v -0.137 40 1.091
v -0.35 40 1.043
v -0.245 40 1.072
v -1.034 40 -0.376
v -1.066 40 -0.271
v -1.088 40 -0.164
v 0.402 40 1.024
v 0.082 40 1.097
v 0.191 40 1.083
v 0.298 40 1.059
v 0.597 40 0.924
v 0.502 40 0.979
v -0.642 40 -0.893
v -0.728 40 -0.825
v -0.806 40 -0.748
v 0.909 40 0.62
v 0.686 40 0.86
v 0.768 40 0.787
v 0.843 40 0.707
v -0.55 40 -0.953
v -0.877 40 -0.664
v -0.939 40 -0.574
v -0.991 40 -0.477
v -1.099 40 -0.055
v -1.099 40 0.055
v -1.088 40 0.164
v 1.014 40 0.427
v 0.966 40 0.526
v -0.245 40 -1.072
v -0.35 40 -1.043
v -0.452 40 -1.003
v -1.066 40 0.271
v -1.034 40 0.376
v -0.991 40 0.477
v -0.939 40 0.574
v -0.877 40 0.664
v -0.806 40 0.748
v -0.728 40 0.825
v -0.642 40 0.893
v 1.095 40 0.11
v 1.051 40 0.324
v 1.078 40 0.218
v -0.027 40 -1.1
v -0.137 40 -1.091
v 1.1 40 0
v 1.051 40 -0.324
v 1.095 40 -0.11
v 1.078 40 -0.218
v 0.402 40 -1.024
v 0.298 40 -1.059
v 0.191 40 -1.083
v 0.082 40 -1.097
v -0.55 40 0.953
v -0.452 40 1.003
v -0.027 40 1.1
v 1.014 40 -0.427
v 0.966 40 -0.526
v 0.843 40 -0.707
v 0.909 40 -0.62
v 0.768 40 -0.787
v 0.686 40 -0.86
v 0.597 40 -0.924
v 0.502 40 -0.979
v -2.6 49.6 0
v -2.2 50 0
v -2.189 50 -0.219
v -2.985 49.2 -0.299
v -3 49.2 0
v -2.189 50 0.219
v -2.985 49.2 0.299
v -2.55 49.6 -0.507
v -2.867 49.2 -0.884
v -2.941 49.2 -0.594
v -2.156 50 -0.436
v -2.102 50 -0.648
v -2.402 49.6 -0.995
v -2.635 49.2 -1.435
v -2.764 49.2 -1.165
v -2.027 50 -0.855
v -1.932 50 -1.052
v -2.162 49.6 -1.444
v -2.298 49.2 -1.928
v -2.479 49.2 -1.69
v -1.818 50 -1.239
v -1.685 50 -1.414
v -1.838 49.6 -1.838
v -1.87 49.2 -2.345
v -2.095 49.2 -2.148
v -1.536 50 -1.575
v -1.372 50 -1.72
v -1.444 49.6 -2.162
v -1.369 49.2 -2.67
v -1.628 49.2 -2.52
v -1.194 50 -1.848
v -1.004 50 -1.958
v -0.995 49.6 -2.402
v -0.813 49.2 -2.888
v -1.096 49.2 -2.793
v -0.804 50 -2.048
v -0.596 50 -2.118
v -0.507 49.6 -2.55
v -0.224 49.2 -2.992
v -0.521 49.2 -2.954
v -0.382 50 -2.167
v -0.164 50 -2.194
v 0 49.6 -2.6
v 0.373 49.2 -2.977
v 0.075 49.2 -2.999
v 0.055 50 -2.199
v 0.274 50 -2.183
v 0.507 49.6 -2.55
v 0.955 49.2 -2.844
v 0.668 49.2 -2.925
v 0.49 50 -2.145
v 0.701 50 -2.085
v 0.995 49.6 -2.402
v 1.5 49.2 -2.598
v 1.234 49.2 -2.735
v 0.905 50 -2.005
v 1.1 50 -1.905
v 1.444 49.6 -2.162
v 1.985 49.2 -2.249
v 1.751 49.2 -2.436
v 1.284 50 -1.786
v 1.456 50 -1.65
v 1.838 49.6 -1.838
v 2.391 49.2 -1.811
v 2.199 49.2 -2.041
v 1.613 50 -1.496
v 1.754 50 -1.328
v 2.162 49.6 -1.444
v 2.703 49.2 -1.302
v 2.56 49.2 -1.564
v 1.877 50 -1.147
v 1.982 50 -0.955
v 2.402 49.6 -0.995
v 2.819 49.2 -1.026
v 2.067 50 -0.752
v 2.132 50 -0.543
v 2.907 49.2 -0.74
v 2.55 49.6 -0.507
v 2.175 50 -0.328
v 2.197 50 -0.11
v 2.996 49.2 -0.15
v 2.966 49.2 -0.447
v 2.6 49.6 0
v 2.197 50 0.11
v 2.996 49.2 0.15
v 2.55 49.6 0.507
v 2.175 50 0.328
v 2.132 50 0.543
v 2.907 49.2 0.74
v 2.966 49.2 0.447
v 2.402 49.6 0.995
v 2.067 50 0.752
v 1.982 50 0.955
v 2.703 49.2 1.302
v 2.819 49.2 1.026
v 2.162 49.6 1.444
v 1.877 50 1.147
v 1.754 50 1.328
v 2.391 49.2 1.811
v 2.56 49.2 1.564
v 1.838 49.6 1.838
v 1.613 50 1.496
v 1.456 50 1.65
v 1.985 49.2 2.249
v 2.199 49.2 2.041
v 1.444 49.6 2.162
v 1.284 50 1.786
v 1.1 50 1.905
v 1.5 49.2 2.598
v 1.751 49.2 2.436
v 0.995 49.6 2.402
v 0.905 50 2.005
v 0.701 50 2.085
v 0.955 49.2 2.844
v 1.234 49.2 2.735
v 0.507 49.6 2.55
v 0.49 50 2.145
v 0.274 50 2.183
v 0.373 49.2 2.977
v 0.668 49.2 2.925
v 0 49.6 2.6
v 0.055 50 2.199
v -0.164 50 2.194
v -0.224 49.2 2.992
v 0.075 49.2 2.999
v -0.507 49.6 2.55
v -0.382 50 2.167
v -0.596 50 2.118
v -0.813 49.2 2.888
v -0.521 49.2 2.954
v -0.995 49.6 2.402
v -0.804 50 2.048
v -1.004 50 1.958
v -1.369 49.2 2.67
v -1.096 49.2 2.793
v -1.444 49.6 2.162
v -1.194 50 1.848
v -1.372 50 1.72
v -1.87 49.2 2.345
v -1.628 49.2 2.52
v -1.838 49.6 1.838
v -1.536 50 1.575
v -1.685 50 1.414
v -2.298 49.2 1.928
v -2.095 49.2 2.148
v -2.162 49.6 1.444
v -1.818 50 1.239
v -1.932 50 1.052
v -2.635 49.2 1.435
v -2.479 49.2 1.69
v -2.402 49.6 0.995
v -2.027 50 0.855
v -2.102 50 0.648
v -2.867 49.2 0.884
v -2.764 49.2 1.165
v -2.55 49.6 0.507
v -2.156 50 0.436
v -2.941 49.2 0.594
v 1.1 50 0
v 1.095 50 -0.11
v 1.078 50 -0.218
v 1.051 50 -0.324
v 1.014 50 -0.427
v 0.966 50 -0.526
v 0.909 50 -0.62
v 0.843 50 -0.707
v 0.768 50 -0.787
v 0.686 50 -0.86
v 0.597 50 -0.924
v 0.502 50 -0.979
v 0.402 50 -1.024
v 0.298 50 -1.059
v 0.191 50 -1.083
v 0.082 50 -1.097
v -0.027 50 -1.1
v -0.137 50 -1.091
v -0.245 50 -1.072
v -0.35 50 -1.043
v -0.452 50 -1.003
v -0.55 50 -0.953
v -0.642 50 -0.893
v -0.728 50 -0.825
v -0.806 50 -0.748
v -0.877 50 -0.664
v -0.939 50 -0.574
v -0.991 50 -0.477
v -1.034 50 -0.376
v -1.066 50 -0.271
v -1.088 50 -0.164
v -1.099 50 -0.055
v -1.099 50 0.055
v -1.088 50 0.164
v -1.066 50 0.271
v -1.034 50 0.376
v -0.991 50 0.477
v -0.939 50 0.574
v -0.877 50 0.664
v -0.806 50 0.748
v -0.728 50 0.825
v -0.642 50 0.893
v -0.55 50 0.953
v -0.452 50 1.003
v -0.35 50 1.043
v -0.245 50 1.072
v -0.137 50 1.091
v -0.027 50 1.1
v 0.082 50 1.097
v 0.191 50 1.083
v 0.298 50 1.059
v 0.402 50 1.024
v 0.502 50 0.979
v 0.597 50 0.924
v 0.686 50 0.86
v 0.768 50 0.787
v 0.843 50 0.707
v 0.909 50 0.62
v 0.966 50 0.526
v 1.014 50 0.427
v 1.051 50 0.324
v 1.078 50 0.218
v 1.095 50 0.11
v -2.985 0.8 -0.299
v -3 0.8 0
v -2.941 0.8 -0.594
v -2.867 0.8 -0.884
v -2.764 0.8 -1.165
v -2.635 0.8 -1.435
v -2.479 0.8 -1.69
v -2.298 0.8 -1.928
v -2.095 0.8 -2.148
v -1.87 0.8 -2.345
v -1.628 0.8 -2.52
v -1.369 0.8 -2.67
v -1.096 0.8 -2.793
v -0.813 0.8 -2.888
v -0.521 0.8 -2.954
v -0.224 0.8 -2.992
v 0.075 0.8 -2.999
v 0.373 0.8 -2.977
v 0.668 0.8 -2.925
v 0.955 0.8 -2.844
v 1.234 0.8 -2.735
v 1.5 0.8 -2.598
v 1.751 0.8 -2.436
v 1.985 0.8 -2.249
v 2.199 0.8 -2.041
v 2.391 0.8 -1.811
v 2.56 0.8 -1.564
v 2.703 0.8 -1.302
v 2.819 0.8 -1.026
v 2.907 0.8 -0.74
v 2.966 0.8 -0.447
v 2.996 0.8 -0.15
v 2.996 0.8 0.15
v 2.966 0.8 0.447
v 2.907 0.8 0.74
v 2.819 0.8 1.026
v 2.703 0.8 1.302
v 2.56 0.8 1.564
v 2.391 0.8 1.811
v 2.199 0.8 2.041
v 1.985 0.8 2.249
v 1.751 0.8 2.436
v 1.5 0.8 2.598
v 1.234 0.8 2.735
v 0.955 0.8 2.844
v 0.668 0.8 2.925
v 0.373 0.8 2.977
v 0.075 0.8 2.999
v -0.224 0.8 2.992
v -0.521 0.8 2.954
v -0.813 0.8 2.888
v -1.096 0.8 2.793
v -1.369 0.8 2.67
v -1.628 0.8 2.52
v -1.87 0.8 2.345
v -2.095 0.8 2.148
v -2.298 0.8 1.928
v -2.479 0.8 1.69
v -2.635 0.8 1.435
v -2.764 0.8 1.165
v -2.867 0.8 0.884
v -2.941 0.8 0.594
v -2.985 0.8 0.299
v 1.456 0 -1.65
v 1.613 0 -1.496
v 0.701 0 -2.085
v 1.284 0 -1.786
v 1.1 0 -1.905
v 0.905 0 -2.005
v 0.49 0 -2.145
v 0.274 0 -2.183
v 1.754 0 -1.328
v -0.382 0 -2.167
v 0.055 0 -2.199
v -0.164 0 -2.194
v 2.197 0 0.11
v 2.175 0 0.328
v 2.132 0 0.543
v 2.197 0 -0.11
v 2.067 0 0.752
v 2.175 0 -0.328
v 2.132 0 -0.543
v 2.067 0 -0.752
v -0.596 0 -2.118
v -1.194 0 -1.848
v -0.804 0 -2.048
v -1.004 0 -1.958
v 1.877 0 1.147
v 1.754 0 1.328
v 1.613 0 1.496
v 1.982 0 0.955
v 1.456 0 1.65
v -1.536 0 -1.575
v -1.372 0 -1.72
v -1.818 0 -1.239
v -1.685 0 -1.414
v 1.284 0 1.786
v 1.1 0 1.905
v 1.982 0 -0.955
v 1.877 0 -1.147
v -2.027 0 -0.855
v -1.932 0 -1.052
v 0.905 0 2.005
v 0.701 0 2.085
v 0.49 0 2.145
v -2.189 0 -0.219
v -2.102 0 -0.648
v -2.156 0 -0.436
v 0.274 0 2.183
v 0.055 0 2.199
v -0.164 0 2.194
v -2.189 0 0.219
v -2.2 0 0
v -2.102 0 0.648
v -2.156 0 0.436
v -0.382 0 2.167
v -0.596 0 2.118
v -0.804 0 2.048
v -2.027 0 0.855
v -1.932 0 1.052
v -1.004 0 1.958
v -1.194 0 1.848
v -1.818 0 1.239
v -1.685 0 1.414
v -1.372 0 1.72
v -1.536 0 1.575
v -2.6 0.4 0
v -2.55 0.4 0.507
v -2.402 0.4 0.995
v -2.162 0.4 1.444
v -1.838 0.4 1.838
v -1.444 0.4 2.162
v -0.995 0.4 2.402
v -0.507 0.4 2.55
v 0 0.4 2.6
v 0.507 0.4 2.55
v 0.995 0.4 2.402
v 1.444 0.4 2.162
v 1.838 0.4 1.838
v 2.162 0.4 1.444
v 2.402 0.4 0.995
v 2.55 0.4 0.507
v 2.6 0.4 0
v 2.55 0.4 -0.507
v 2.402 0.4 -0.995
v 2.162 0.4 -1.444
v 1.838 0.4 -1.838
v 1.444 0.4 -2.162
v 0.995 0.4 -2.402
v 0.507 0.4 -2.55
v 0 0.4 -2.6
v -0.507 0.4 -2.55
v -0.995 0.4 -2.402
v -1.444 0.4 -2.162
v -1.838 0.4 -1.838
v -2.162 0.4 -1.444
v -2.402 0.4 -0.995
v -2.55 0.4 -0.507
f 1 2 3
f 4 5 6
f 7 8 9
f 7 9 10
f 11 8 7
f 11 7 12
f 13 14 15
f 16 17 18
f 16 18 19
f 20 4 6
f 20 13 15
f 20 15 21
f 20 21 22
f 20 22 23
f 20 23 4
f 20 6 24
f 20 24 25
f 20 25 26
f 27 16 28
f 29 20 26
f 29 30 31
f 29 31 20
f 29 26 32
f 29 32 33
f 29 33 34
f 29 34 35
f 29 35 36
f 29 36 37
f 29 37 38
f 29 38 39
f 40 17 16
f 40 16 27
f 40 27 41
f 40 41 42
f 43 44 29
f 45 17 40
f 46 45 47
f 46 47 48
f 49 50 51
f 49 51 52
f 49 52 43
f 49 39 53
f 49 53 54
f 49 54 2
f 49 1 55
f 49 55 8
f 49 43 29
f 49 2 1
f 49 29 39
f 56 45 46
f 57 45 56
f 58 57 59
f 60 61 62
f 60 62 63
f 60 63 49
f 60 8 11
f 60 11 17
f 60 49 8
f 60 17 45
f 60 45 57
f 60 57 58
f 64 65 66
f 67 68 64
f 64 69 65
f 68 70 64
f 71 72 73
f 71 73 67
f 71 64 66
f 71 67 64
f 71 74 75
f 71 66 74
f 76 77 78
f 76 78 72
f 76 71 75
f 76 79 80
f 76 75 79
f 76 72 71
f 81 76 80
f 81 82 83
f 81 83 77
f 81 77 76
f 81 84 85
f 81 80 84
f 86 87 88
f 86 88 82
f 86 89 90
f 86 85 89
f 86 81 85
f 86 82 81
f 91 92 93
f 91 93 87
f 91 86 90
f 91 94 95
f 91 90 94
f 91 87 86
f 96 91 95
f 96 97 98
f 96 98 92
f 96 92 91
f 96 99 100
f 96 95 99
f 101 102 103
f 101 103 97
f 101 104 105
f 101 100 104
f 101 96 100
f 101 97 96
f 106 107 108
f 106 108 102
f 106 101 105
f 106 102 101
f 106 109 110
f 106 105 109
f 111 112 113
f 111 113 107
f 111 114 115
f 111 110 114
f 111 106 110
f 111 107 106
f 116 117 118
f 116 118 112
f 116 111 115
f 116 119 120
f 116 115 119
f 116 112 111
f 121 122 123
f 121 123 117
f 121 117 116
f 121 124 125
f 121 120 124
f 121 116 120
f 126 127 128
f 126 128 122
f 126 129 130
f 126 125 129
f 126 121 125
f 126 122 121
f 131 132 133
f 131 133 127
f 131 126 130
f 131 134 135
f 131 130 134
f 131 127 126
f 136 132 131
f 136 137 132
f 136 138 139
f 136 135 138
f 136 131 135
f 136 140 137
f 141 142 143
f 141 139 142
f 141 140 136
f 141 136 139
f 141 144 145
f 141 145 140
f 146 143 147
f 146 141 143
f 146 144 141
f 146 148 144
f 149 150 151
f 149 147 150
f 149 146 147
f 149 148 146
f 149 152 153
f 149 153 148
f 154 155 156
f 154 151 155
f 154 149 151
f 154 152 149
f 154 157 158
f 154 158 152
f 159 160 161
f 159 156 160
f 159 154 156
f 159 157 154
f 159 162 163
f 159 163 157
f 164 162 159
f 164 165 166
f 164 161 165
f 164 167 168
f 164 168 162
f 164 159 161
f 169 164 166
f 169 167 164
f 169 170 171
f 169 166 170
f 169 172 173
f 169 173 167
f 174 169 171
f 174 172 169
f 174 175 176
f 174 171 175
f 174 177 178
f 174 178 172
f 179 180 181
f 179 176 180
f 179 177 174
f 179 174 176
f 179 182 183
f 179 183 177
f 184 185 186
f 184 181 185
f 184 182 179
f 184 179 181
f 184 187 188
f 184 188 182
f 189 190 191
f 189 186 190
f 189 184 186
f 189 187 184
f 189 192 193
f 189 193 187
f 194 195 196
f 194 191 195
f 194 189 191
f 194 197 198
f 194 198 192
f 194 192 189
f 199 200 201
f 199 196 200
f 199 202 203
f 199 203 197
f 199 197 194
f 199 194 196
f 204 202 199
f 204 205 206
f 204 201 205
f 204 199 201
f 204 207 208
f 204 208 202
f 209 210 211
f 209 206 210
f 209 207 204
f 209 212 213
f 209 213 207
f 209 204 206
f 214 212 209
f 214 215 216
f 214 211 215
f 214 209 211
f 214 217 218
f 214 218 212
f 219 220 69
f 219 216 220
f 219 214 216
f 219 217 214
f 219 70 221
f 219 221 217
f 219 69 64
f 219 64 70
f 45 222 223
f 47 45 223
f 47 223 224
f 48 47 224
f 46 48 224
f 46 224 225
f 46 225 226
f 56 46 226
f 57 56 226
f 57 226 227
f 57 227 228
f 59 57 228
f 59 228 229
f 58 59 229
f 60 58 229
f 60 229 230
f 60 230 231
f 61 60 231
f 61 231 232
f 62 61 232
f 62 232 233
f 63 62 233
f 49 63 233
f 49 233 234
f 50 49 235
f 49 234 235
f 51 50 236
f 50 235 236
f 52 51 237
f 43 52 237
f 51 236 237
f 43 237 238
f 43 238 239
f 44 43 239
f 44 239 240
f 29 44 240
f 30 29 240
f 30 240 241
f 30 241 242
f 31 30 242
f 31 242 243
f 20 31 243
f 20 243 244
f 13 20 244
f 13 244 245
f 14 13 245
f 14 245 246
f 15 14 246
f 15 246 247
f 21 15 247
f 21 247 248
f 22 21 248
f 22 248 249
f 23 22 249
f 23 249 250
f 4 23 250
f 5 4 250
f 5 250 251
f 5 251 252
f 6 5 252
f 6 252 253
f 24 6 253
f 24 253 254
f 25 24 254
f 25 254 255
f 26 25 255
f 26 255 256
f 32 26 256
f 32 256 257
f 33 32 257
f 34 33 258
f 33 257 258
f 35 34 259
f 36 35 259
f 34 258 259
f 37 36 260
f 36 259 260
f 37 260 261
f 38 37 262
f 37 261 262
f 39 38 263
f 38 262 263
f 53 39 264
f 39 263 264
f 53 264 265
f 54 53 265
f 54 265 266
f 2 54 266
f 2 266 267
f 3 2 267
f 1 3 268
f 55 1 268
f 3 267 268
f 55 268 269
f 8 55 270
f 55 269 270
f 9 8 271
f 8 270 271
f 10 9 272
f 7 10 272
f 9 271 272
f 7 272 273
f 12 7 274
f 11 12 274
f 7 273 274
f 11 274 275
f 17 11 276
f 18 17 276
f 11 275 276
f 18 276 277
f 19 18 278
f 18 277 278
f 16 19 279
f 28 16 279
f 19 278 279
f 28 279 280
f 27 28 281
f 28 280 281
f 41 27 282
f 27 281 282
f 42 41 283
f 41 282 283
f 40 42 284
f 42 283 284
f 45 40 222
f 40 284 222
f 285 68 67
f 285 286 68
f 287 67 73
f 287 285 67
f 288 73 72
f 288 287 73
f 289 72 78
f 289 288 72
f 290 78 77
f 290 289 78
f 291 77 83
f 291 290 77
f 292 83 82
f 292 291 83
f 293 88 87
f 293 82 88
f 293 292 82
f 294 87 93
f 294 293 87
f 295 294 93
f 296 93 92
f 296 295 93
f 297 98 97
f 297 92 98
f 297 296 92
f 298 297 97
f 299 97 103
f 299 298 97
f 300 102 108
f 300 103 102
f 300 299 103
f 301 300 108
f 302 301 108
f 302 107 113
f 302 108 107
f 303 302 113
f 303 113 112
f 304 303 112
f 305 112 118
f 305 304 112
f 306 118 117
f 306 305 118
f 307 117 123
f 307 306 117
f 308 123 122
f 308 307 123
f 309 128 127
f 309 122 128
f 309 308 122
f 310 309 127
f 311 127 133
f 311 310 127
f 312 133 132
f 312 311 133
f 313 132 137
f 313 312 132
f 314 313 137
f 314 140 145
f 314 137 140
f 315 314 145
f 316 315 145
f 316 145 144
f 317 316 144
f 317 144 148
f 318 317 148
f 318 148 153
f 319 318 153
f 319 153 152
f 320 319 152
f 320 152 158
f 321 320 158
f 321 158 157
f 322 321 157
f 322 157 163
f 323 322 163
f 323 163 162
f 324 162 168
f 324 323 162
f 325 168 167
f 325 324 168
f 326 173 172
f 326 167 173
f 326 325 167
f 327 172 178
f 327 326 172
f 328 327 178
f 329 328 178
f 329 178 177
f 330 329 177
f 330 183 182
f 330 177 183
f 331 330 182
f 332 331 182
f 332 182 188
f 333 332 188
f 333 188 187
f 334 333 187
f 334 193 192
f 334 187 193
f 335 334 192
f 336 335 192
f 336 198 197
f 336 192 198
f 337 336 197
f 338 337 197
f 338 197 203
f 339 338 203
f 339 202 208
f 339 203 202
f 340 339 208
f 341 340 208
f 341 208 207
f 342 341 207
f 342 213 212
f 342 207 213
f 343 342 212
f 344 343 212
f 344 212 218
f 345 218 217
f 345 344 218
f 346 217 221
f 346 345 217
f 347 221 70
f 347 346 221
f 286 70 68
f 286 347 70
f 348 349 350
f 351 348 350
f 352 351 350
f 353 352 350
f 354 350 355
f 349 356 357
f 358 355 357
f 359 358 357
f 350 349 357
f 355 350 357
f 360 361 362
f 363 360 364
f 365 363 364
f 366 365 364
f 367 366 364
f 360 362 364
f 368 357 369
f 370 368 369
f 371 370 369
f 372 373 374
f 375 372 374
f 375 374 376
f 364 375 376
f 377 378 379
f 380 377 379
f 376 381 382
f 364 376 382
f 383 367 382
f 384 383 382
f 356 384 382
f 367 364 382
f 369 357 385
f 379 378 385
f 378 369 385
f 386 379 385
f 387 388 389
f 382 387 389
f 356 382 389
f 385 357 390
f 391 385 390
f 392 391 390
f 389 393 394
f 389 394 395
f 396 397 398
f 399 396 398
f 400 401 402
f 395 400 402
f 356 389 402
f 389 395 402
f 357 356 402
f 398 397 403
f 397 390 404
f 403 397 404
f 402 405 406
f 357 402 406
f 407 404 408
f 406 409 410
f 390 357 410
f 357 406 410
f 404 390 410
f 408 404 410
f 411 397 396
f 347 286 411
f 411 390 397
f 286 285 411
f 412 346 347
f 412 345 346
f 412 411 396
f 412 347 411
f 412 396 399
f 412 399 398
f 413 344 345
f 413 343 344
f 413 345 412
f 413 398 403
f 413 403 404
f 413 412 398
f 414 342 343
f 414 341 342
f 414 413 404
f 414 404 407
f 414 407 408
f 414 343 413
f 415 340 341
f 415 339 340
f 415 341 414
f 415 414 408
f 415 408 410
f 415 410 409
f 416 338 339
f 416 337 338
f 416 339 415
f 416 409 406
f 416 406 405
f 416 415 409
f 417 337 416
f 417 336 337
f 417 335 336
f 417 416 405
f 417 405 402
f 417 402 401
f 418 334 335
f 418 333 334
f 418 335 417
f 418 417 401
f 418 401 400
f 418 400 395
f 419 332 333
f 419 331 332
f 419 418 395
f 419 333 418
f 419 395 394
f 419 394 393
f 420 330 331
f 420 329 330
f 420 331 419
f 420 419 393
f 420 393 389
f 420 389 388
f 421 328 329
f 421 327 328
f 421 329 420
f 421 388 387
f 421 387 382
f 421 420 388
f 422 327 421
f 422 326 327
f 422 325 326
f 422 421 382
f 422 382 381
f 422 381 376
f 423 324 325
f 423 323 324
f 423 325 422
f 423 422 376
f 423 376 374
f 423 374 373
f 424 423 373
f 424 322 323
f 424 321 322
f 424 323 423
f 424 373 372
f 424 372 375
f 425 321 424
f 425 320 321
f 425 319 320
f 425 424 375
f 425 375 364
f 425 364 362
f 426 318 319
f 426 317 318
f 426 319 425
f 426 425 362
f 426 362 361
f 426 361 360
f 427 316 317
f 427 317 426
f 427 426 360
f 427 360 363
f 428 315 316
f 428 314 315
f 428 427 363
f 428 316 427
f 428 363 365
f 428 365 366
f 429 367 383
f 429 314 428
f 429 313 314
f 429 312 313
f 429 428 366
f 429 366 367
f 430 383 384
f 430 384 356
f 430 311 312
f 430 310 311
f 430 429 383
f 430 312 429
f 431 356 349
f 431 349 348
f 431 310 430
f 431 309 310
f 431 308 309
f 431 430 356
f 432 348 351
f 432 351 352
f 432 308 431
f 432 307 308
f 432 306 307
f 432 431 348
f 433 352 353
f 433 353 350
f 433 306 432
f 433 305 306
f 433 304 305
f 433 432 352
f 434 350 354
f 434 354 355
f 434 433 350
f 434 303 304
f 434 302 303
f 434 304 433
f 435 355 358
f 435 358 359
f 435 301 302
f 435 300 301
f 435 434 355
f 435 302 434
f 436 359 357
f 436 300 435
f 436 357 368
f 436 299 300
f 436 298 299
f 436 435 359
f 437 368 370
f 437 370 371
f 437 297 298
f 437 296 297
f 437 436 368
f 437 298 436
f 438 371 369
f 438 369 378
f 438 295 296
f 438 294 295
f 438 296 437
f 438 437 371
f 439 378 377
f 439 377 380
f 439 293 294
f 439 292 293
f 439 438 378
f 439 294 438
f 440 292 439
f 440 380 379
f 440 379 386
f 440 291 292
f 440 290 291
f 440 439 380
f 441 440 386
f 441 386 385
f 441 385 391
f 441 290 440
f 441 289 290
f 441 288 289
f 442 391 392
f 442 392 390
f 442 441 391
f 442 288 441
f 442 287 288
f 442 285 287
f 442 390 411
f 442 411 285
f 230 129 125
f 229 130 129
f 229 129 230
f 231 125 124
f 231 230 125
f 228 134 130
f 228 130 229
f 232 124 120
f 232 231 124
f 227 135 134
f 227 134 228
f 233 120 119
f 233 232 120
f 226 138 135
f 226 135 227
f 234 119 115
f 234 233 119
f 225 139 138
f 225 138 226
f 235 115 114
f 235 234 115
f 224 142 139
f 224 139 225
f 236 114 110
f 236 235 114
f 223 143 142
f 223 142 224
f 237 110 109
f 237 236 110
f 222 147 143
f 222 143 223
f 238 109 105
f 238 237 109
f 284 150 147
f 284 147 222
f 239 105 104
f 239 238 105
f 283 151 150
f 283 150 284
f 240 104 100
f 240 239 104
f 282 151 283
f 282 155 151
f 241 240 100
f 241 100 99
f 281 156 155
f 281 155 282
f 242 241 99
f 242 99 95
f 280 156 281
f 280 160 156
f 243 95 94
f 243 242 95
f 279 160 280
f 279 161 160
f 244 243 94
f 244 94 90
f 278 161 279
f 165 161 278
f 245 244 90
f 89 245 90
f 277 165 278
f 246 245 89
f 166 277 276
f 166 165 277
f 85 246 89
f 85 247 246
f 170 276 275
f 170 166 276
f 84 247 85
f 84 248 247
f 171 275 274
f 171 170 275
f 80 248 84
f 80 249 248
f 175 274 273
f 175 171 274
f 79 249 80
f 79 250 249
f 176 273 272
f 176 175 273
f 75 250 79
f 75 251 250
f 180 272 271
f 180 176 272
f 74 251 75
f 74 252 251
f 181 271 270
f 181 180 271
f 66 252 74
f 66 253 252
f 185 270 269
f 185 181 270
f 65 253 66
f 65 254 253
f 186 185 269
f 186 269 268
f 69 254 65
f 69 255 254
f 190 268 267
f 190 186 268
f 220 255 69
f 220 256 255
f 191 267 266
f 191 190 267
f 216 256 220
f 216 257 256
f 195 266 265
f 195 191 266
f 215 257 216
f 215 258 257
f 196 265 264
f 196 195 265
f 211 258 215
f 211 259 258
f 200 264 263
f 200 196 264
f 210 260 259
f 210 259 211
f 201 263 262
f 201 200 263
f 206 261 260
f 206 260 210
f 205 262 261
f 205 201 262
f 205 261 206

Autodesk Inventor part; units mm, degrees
ref_plane "YZ Plane" through (0, 0, 0) normal (1, 0, 0) x (0, 1, 0)
ref_plane "XZ Plane" through (0, 0, 0) normal (0, 1, 0) x (-1, 0, 0)
ref_plane "XY Plane" through (0, 0, 0) normal (0, 0, 1) x (1, 0, 0)
sketch "Sketch1" plane through (0, 0, 0) normal (0, 1, 0) x (-1, 0, 0)
  circle A0 centre (0, 0) radius 3
  dimension "d2" = 6
extrude "Extrusion1" add sketch "Sketch1" along normal blind 50
chamfer "Chamfer1" distance 0.8 angle 45 2 edges at (3, 50, 0) (3, 0, 0)
sketch "Sketch2" plane through (0, 50, 0) normal (0, 1, 0) x (1, 0, 0)
  circle A0 centre (0, 0) radius 1.1
  dimension "d8" = 2.2
extrude "Extrusion2" cut sketch "Sketch2" against normal blind 10
properties part number "bar"
